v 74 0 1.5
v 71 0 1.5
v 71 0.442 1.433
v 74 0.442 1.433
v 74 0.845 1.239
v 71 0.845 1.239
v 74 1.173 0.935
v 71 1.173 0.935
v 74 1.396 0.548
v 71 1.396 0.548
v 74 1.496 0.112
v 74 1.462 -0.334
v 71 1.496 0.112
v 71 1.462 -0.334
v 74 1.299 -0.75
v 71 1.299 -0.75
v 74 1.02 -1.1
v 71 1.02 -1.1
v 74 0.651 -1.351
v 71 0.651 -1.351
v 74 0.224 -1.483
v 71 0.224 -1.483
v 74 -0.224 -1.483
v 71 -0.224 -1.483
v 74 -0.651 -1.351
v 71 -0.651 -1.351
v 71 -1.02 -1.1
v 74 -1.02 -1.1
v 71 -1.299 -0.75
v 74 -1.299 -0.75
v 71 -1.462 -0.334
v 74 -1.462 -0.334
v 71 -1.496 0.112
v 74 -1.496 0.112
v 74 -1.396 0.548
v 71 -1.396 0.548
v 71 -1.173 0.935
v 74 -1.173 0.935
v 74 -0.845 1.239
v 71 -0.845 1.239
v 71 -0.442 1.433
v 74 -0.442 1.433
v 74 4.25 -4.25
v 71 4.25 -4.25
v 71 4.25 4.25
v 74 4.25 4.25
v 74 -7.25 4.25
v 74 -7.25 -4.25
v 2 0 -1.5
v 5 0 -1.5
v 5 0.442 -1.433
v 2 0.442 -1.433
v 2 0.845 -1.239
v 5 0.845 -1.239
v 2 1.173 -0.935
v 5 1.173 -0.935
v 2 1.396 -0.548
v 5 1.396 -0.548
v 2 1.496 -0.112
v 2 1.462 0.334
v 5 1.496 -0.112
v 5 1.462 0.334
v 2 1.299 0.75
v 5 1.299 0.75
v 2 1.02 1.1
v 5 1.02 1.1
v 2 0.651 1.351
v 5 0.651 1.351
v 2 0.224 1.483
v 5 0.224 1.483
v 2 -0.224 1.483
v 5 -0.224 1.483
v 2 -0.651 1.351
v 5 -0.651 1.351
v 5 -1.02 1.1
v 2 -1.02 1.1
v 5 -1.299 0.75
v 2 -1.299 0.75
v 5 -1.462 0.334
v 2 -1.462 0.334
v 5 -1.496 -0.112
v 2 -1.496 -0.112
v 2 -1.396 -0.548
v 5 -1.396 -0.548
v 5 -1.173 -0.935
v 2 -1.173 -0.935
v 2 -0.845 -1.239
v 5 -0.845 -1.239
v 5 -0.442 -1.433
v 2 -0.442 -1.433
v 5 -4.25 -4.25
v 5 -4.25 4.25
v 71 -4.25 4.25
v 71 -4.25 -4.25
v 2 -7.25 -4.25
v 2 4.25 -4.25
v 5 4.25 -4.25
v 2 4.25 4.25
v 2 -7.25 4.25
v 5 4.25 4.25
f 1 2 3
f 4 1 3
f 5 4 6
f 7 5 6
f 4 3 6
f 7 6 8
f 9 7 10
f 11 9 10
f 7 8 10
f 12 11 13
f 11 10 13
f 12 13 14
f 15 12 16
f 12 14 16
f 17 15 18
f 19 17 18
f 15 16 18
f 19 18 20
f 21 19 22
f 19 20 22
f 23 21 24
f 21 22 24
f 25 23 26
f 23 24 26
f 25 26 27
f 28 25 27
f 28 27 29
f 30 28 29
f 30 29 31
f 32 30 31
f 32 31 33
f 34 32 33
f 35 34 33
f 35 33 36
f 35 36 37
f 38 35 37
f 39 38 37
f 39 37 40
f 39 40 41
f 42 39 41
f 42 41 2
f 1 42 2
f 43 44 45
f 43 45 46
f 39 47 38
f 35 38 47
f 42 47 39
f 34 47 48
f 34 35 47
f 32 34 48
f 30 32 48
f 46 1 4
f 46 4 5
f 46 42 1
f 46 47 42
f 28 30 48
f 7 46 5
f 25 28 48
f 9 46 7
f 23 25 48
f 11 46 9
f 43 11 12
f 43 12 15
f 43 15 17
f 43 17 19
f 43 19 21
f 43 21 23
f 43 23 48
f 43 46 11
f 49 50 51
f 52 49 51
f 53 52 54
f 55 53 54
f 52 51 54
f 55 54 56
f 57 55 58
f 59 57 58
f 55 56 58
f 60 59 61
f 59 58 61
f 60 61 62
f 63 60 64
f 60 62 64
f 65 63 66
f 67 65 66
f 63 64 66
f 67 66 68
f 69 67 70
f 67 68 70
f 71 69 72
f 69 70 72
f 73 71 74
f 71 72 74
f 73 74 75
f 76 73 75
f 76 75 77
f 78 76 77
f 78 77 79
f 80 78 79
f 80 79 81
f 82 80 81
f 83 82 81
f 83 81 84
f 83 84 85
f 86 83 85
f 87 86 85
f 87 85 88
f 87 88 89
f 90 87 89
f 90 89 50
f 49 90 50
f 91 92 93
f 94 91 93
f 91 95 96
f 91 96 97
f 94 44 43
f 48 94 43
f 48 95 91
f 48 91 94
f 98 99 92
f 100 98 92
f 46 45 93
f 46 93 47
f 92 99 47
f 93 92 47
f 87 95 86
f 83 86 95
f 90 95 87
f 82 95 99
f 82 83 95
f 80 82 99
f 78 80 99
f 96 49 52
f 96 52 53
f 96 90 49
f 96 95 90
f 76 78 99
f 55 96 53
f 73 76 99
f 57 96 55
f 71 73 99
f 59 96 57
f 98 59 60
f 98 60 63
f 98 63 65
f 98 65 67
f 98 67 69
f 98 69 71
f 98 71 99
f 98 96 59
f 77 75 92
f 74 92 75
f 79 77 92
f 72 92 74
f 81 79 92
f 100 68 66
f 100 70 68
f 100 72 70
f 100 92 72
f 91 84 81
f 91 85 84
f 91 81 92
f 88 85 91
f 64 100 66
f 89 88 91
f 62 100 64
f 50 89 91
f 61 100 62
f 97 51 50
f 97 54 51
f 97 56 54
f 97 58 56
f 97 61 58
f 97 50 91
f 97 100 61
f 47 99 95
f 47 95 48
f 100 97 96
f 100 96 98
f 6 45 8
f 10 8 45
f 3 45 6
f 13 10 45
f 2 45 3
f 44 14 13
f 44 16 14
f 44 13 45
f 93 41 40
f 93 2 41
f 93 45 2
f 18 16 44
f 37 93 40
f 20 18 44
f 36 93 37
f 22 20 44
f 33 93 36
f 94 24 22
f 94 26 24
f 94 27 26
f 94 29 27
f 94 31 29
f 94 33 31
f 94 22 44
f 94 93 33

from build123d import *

# Parameters (mm, degrees)
SKETCH1_W           = 8.5
SKETCH1_H           = 8.5
BOSS_EXTRUDE1_DEPTH = 5
SKETCH2_W           = 8.5
SKETCH2_H           = 8.5
BOSS_EXTRUDE2_DEPTH = 2
SKETCH3_R           = 1.5
CUT_EXTRUDE1_DEPTH  = 2
SKETCH4_W           = 80
SKETCH4_H           = 8.5
BOSS_EXTRUDE3_DEPTH = 3
SKETCH5_W           = 7
SKETCH5_H           = 8.5
BOSS_EXTRUDE4_DEPTH = 8.5
CUT_EXTRUDE2_DEPTH  = 5
SKETCH7_R           = 1.5
CUT_EXTRUDE3_DEPTH  = 5
CUT_EXTRUDE4_DEPTH  = 10
SKETCH9_W           = 8.5
SKETCH9_H           = 8.5
SKETCH9_R           = 1.5
BOSS_EXTRUDE5_DEPTH = 2
CUT_EXTRUDE5_DEPTH  = 2
SKETCH11_W          = 8.5
SKETCH11_H          = 8.5
SKETCH11_R          = 1.5
BOSS_EXTRUDE6_DEPTH = 2
BOSS_EXTRUDE7_DEPTH = 5
BOSS_EXTRUDE8_DEPTH = 5
SKETCH14_W          = 8.5
SKETCH14_H          = 11.5
CUT_EXTRUDE6_DEPTH  = 4
SKETCH15_W          = 8.5
SKETCH15_H          = 11.5
CUT_EXTRUDE7_DEPTH  = 4
SKETCH16_R          = 1.5
CUT_EXTRUDE8_DEPTH  = 4
SKETCH17_R          = 1.5
CUT_EXTRUDE9_DEPTH  = 4


with BuildPart() as part:
    # Sketch1 → Boss-Extrude1 (new body)
    with BuildSketch(Plane(origin=(0, 0, 0), x_dir=(0, 0, -1), z_dir=(1, 0, 0))):
        Rectangle(SKETCH1_W, SKETCH1_H)
        Polygon((1.58771324, 2.75), (-1.58771324, 2.75), (-3.175426481, 0), (-1.58771324, -2.75), (1.58771324, -2.75), (3.175426481, 0), align=None, mode=Mode.SUBTRACT)
    extrude(amount=BOSS_EXTRUDE1_DEPTH)

    # Sketch2 → Boss-Extrude2 (add)
    with BuildSketch(Plane.ZY):
        Rectangle(SKETCH2_W, SKETCH2_H)
    extrude(amount=BOSS_EXTRUDE2_DEPTH)

    # Sketch3 → Cut-Extrude1 (cut)
    with BuildSketch(Plane(origin=(0, 0, 0), x_dir=(0, 0, -1), z_dir=(1, 0, 0))):
        Circle(SKETCH3_R)
    extrude(amount=-CUT_EXTRUDE1_DEPTH, mode=Mode.SUBTRACT)

    # Sketch4 → Boss-Extrude3 (add)
    with BuildSketch(Plane.XZ.offset(4.25)):
        with Locations((38, 0)):
            Rectangle(SKETCH4_W, SKETCH4_H)
    extrude(amount=BOSS_EXTRUDE3_DEPTH)

    # Sketch5 → Boss-Extrude4 (add)
    with BuildSketch(Plane(origin=(0, -4.25, 0), x_dir=(1, 0, 0), z_dir=(0, 1, 0))):
        with Locations((74.5, 0)):
            Rectangle(SKETCH5_W, SKETCH5_H)
    extrude(amount=BOSS_EXTRUDE4_DEPTH)

    # Sketch6 → Cut-Extrude2 (cut)
    with BuildSketch(Plane.ZY.offset(-71)):
        Polygon((3.175426481, 0), (1.58771324, 2.75), (-1.58771324, 2.75), (-3.175426481, 0), (-1.58771324, -2.75), (1.58771324, -2.75), align=None)
    extrude(amount=-CUT_EXTRUDE2_DEPTH, mode=Mode.SUBTRACT)

    # Sketch7 → Cut-Extrude3 (cut)
    with BuildSketch(Plane.ZY.offset(-76)):
        Circle(SKETCH7_R)
    extrude(amount=-CUT_EXTRUDE3_DEPTH, mode=Mode.SUBTRACT)

    # Sketch8 → Cut-Extrude4 (cut)
    with BuildSketch(Plane.ZY.offset(2)):
        Polygon((-1.58771324, 2.75), (1.58771324, 2.75), (3.175426481, 0), (1.58771324, -2.75), (-1.58771324, -2.75), (-3.175426481, 0), align=None)
    extrude(amount=-CUT_EXTRUDE4_DEPTH, mode=Mode.SUBTRACT)

    # Sketch9 → Boss-Extrude5 (add)
    with BuildSketch(Plane(origin=(5, 0, 0), x_dir=(0, 0, -1), z_dir=(1, 0, 0))):
        Rectangle(SKETCH9_W, SKETCH9_H)
        Circle(SKETCH9_R, mode=Mode.SUBTRACT)
    extrude(amount=-BOSS_EXTRUDE5_DEPTH)

    # Sketch10 → Cut-Extrude5 (cut)
    with BuildSketch(Plane(origin=(78, 0, 0), x_dir=(0, 0, -1), z_dir=(1, 0, 0))):
        Polygon((-3.175426481, 0), (-1.58771324, 2.75), (1.58771324, 2.75), (3.175426481, 0), (1.58771324, -2.75), (-1.58771324, -2.75), align=None)
    extrude(amount=-CUT_EXTRUDE5_DEPTH, mode=Mode.SUBTRACT)

    # Sketch11 → Boss-Extrude6 (add)
    with BuildSketch(Plane.ZY.offset(-71)):
        Rectangle(SKETCH11_W, SKETCH11_H)
        Circle(SKETCH11_R, mode=Mode.SUBTRACT)
    extrude(amount=-BOSS_EXTRUDE6_DEPTH)

    # Sketch12 → Boss-Extrude7 (add)
    with BuildSketch(Plane.ZY.offset(-3)):
        Polygon((-3.175426481, 0), (-1.58771324, 2.75), (1.58771324, 2.75), (3.175426481, 0), (1.58771324, -2.75), (-1.58771324, -2.75), align=None)
    extrude(amount=BOSS_EXTRUDE7_DEPTH)

    # Sketch13 → Boss-Extrude8 (add)
    with BuildSketch(Plane(origin=(73, 0, 0), x_dir=(0, 0, -1), z_dir=(1, 0, 0))):
        Polygon((-1.58771324, 2.75), (-3.175426481, 0), (-1.58771324, -2.75), (1.58771324, -2.75), (3.175426481, 0), (1.58771324, 2.75), align=None)
    extrude(amount=BOSS_EXTRUDE8_DEPTH)

    # Sketch14 → Cut-Extrude6 (cut)
    with BuildSketch(Plane.ZY.offset(2)):
        with Locations((0, -1.5)):
            Rectangle(SKETCH14_W, SKETCH14_H)
    extrude(amount=-CUT_EXTRUDE6_DEPTH, mode=Mode.SUBTRACT)

    # Sketch15 → Cut-Extrude7 (cut)
    with BuildSketch(Plane(origin=(78, 0, 0), x_dir=(0, 0, -1), z_dir=(1, 0, 0))):
        with Locations((0, -1.5)):
            Rectangle(SKETCH15_W, SKETCH15_H)
    extrude(amount=-CUT_EXTRUDE7_DEPTH, mode=Mode.SUBTRACT)

    # Sketch16 → Cut-Extrude8 (cut)
    with BuildSketch(Plane(origin=(5, 0, 0), x_dir=(0, 0, -1), z_dir=(1, 0, 0))):
        Circle(SKETCH16_R)
    extrude(amount=-CUT_EXTRUDE8_DEPTH, mode=Mode.SUBTRACT)

    # Sketch17 → Cut-Extrude9 (cut)
    with BuildSketch(Plane.ZY.offset(-73)):
        Circle(SKETCH17_R)
    extrude(amount=-CUT_EXTRUDE9_DEPTH, mode=Mode.SUBTRACT)


solid = part.part
